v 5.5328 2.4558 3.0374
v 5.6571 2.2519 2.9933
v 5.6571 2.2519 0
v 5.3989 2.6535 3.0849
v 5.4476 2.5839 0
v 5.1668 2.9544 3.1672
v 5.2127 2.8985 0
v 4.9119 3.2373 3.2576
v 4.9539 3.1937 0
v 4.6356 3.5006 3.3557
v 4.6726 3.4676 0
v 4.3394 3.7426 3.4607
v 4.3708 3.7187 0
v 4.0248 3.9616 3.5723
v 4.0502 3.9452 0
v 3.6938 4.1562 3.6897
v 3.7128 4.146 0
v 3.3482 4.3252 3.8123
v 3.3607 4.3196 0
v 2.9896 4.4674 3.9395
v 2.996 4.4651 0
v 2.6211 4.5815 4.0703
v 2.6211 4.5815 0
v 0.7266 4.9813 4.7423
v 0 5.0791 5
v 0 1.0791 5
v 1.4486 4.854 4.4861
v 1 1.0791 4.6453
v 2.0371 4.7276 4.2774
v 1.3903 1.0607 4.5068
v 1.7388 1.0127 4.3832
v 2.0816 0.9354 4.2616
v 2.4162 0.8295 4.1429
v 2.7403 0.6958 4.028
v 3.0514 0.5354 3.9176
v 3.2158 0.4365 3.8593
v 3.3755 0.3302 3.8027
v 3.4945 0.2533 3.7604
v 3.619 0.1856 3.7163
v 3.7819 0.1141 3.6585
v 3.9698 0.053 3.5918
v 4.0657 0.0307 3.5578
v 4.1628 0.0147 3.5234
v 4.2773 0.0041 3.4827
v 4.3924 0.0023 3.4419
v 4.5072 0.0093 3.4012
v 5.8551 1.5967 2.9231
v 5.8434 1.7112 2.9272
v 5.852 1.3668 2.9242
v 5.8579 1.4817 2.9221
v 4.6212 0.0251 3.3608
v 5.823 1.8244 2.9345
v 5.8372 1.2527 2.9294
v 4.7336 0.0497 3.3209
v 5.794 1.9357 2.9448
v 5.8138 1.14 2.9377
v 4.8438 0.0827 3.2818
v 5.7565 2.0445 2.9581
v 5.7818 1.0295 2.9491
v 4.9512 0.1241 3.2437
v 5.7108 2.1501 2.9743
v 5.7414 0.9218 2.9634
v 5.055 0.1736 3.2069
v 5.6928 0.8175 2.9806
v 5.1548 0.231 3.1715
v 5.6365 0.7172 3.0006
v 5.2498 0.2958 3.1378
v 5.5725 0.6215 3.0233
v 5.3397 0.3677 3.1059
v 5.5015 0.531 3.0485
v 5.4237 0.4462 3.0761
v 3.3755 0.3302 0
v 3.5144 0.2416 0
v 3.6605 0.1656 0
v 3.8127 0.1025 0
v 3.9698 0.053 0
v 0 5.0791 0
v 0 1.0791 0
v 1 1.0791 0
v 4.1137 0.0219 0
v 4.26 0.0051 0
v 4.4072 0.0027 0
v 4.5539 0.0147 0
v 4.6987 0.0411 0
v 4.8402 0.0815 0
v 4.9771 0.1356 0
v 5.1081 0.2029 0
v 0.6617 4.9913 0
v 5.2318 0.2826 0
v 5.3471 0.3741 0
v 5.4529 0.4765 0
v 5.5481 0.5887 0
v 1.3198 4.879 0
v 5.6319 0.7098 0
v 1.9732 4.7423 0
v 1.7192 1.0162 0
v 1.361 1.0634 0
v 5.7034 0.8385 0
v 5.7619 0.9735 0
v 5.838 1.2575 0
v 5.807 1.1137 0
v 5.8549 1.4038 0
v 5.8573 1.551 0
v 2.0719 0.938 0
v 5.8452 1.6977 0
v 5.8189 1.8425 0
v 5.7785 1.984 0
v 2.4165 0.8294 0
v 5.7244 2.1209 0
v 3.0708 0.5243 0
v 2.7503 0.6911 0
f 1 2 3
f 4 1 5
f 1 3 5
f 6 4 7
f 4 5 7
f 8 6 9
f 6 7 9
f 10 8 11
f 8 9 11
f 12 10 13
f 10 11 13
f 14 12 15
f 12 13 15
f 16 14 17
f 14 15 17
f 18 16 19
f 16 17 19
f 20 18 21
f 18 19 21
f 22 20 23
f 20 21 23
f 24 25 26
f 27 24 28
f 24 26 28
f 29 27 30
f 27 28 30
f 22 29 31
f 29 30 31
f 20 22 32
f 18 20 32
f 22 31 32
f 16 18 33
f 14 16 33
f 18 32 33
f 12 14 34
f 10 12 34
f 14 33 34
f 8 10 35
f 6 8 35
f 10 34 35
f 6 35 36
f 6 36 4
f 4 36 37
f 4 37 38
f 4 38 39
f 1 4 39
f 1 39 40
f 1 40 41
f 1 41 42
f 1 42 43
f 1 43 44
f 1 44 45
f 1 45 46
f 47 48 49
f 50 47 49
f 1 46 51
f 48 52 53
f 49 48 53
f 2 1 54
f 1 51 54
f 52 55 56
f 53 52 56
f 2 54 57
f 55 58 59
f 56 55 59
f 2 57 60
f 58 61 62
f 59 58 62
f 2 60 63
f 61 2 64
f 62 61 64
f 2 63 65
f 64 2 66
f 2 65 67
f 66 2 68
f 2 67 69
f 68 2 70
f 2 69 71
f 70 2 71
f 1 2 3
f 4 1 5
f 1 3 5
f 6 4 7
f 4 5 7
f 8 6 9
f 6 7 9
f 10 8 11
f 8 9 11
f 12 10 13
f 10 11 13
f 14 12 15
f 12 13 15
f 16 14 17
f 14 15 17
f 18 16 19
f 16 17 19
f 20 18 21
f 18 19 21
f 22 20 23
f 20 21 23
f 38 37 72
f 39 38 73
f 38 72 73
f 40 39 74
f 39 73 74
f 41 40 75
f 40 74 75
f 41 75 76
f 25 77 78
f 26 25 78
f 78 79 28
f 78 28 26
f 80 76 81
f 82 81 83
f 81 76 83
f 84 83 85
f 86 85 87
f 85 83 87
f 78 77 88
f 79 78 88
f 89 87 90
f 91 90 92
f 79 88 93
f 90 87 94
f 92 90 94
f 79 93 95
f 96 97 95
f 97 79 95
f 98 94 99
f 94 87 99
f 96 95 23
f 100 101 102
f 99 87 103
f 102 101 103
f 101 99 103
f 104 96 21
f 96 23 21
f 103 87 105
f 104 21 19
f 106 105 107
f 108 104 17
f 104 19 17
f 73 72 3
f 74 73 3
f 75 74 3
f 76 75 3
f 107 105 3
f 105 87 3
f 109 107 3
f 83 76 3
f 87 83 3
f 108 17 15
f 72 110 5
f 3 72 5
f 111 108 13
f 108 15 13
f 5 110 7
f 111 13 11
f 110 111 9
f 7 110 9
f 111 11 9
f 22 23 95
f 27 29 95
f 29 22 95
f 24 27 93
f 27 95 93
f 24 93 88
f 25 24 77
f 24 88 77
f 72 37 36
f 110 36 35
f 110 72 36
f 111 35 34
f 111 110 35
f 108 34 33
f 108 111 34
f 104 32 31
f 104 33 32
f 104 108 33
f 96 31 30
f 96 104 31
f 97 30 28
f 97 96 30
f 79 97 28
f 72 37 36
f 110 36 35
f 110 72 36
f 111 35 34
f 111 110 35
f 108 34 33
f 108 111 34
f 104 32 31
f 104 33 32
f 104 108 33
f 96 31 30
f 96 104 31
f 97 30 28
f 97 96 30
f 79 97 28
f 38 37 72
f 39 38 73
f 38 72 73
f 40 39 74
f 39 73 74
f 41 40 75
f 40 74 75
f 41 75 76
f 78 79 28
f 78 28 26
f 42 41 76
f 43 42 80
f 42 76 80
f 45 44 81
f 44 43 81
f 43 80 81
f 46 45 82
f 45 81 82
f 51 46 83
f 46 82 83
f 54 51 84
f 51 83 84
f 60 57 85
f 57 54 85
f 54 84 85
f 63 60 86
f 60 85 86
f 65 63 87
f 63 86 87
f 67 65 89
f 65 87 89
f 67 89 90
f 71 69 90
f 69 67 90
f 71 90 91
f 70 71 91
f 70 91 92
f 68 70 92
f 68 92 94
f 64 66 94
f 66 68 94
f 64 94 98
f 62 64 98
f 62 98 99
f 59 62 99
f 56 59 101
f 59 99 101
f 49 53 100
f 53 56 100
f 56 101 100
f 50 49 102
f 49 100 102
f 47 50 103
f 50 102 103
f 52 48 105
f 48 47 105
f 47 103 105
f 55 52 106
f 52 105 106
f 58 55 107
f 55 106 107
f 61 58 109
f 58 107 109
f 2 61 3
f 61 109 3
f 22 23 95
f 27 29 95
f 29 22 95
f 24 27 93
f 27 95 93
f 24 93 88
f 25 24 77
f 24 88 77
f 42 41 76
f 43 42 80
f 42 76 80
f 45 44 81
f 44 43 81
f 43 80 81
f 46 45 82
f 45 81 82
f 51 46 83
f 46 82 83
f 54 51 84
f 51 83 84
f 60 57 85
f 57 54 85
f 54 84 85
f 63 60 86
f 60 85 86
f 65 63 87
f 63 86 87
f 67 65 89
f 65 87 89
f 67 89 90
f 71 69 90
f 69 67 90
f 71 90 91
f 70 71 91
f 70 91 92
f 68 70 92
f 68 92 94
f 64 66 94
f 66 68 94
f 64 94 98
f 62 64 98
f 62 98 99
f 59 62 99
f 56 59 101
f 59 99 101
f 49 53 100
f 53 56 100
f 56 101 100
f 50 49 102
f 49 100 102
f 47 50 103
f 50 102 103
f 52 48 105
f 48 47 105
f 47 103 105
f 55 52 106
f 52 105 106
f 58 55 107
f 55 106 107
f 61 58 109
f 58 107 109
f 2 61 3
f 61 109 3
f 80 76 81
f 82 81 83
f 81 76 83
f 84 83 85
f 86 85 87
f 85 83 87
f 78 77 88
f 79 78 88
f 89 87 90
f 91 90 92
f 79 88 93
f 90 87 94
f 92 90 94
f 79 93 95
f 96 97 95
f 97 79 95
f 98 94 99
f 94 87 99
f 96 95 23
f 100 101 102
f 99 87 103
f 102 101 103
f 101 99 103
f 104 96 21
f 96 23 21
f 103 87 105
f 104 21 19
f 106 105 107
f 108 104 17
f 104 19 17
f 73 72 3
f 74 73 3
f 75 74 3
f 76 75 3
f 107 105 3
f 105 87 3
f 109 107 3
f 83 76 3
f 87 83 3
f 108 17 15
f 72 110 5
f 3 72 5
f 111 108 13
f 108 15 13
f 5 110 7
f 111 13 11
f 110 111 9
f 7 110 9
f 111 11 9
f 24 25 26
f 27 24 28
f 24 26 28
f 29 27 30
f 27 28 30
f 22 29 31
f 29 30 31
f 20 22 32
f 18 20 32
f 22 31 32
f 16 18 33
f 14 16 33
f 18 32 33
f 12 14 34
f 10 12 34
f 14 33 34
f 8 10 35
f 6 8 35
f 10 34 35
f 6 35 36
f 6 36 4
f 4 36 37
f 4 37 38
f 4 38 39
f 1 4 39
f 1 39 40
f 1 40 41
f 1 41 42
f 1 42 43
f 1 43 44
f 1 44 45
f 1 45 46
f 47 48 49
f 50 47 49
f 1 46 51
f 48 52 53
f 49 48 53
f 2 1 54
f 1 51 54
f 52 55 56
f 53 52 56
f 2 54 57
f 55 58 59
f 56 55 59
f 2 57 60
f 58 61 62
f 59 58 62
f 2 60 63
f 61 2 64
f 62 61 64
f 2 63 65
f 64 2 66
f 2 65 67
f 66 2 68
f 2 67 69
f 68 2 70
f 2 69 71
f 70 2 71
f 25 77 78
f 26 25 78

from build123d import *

# Parameters (mm, degrees)
EXTRUDE001_DEPTH                     = 7
EXTRUDE001_ONTO_SKETCH001_ROLL_ANGLE = 90
EXTRUDE_DEPTH                        = 5


with BuildPart() as cut:
    # Sketch001 as drawn → Extrude001 (new)
    with BuildSketch(Plane.XY):
        Polygon((0, 5), (5.9, 2.90716), (5.9, 0), (0, 0), align=None)
    extrude(amount=-EXTRUDE001_DEPTH)


with BuildPart() as cut_1:
    # Extrude001 onto Sketch001 roll: moved
    add(cut.part.rotate(Axis((0, 0, 0), (1, 0, 0)), EXTRUDE001_ONTO_SKETCH001_ROLL_ANGLE))


with BuildPart() as cut_2:
    # Extrude001 onto Sketch001 placement: moved
    add(cut_1.part)


with BuildPart() as lug:
    # Sketch → Extrude (new body)
    with BuildSketch(Plane.XY):
        with BuildLine():
            ThreePointArc((2.621085, 4.581518), (1.319775, 4.87896), (0, 5.079147))
            Line((0, 5.079147), (0, 1.079147))
            Line((1, 1.079147), (0, 1.079147))
            ThreePointArc((3.37547, 0.330164), (2.245375, 0.887465), (1, 1.079147))
            ThreePointArc((3.37547, 0.330164), (3.660536, 0.165581), (3.96985, 0.053))
            ThreePointArc((3.96985, 0.053), (5.548108, 0.588746), (5.657117, 2.251889))
            ThreePointArc((5.657117, 2.251889), (4.370797, 3.718655), (2.621085, 4.581518))
        make_face()
    extrude(amount=EXTRUDE_DEPTH)


with BuildPart() as common:
    # Common base: copy of Lug
    add(lug.part)

    # Common: intersect cut
    add(cut_2.part, mode=Mode.INTERSECT)


with BuildPart() as common001:
    # Common001 base: copy of Lug
    add(lug.part)

    # Common001: intersect cut
    add(cut_2.part, mode=Mode.INTERSECT)


solid = Compound([common.part, common001.part])
